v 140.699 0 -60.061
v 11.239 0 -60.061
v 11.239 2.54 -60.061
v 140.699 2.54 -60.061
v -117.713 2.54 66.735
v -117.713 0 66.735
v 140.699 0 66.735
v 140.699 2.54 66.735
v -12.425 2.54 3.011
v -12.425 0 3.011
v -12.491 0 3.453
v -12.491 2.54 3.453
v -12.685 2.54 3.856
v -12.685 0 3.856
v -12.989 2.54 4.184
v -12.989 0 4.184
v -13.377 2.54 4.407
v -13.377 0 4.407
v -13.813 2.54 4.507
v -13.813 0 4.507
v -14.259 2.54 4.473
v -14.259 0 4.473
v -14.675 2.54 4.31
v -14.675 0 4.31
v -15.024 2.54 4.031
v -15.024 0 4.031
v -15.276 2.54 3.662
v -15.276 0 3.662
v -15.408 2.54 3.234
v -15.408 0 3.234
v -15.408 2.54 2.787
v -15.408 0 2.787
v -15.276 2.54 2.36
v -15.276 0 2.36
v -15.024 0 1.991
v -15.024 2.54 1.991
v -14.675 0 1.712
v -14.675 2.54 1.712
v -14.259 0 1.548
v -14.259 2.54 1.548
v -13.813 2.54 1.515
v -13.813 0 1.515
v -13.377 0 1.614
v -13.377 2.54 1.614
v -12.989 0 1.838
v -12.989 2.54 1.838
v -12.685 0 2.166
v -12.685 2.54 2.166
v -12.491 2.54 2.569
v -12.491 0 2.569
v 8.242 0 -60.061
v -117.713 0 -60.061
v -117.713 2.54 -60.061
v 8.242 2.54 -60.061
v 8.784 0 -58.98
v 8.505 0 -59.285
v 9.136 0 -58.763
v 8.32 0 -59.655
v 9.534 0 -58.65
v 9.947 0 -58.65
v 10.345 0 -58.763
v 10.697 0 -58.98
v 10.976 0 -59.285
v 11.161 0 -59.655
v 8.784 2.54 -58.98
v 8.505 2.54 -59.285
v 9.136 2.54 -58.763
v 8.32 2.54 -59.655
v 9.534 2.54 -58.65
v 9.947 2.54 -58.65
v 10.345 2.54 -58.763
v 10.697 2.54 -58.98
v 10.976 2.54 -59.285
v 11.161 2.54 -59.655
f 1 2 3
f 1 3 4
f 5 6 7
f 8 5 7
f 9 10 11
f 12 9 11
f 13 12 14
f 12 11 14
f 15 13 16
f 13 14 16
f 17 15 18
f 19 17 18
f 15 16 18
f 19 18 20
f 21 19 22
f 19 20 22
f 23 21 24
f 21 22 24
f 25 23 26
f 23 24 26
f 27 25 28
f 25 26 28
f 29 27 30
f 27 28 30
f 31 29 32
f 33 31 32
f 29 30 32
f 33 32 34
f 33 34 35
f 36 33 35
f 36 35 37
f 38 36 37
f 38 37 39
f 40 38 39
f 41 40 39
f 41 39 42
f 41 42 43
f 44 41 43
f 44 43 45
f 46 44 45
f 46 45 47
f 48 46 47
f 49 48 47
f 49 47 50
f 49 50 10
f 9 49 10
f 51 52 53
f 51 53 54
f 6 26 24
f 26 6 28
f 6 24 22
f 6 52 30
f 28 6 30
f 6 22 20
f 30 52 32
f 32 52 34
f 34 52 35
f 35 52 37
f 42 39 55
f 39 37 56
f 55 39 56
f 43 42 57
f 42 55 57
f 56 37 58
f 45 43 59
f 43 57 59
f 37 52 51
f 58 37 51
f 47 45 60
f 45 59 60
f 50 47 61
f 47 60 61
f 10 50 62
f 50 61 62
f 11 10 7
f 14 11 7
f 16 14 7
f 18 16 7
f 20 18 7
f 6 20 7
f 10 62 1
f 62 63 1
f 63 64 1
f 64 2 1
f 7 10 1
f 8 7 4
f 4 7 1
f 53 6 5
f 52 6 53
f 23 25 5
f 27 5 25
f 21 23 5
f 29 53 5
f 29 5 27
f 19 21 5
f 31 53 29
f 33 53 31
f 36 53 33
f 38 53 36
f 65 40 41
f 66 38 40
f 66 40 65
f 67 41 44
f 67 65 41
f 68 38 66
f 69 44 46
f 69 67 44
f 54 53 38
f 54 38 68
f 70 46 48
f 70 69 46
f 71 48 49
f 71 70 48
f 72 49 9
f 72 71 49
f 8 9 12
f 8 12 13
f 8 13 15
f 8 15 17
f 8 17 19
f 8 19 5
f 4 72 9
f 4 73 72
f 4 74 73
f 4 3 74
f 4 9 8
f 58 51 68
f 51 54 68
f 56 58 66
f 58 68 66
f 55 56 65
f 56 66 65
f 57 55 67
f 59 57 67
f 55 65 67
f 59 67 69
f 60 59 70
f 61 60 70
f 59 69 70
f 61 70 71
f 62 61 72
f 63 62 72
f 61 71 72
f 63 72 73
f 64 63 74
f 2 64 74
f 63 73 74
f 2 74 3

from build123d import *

# Parameters (mm, degrees)
SKETCH1_W                    = 258.4113781
SKETCH1_H                    = 126.795826844
BOSS_EXTRUDE1_DEPTH          = 2.54
F_3_0_3_DIAMETER_HOLE1_D     = 3
F_3_0_3_DIAMETER_HOLE1_DEPTH = 25.4
F_3_0_3_DIAMETER_HOLE1_TIP   = 0.901290929
F_3_0_3_DIAMETER_HOLE2_D     = 3
F_3_0_3_DIAMETER_HOLE2_DEPTH = 25.4
F_3_0_3_DIAMETER_HOLE2_TIP   = 0.901290929


with BuildPart() as part:
    # Sketch1 → Boss-Extrude1 (new body)
    with BuildSketch(Plane(origin=(0, 0, 0), x_dir=(1, 0, 0), z_dir=(0, 1, 0))):
        with Locations((11.493188983, -3.336732285)):
            Rectangle(SKETCH1_W, SKETCH1_H)
    extrude(amount=BOSS_EXTRUDE1_DEPTH)

    # Ø3.0 (3) Diameter Hole1
    with Locations(Plane(origin=(0, 2.54, 0), x_dir=(-1, 0, 0), z_dir=(0, 1, 0))):
        with Locations((13.924720288, 3.010786642)):
            Hole(F_3_0_3_DIAMETER_HOLE1_D / 2, depth=F_3_0_3_DIAMETER_HOLE1_DEPTH)
            with Locations((0, 0, -(F_3_0_3_DIAMETER_HOLE1_DEPTH + F_3_0_3_DIAMETER_HOLE1_TIP / 2))):  # 118° drill point
                Cone(0, F_3_0_3_DIAMETER_HOLE1_D / 2, F_3_0_3_DIAMETER_HOLE1_TIP, mode=Mode.SUBTRACT)

    # Ø3.0 (3) Diameter Hole2
    with Locations(Plane.XZ):
        with Locations((9.740449038, -60.135696584)):
            Hole(F_3_0_3_DIAMETER_HOLE2_D / 2, depth=F_3_0_3_DIAMETER_HOLE2_DEPTH)
            with Locations((0, 0, -(F_3_0_3_DIAMETER_HOLE2_DEPTH + F_3_0_3_DIAMETER_HOLE2_TIP / 2))):  # 118° drill point
                Cone(0, F_3_0_3_DIAMETER_HOLE2_D / 2, F_3_0_3_DIAMETER_HOLE2_TIP, mode=Mode.SUBTRACT)


solid = part.part
